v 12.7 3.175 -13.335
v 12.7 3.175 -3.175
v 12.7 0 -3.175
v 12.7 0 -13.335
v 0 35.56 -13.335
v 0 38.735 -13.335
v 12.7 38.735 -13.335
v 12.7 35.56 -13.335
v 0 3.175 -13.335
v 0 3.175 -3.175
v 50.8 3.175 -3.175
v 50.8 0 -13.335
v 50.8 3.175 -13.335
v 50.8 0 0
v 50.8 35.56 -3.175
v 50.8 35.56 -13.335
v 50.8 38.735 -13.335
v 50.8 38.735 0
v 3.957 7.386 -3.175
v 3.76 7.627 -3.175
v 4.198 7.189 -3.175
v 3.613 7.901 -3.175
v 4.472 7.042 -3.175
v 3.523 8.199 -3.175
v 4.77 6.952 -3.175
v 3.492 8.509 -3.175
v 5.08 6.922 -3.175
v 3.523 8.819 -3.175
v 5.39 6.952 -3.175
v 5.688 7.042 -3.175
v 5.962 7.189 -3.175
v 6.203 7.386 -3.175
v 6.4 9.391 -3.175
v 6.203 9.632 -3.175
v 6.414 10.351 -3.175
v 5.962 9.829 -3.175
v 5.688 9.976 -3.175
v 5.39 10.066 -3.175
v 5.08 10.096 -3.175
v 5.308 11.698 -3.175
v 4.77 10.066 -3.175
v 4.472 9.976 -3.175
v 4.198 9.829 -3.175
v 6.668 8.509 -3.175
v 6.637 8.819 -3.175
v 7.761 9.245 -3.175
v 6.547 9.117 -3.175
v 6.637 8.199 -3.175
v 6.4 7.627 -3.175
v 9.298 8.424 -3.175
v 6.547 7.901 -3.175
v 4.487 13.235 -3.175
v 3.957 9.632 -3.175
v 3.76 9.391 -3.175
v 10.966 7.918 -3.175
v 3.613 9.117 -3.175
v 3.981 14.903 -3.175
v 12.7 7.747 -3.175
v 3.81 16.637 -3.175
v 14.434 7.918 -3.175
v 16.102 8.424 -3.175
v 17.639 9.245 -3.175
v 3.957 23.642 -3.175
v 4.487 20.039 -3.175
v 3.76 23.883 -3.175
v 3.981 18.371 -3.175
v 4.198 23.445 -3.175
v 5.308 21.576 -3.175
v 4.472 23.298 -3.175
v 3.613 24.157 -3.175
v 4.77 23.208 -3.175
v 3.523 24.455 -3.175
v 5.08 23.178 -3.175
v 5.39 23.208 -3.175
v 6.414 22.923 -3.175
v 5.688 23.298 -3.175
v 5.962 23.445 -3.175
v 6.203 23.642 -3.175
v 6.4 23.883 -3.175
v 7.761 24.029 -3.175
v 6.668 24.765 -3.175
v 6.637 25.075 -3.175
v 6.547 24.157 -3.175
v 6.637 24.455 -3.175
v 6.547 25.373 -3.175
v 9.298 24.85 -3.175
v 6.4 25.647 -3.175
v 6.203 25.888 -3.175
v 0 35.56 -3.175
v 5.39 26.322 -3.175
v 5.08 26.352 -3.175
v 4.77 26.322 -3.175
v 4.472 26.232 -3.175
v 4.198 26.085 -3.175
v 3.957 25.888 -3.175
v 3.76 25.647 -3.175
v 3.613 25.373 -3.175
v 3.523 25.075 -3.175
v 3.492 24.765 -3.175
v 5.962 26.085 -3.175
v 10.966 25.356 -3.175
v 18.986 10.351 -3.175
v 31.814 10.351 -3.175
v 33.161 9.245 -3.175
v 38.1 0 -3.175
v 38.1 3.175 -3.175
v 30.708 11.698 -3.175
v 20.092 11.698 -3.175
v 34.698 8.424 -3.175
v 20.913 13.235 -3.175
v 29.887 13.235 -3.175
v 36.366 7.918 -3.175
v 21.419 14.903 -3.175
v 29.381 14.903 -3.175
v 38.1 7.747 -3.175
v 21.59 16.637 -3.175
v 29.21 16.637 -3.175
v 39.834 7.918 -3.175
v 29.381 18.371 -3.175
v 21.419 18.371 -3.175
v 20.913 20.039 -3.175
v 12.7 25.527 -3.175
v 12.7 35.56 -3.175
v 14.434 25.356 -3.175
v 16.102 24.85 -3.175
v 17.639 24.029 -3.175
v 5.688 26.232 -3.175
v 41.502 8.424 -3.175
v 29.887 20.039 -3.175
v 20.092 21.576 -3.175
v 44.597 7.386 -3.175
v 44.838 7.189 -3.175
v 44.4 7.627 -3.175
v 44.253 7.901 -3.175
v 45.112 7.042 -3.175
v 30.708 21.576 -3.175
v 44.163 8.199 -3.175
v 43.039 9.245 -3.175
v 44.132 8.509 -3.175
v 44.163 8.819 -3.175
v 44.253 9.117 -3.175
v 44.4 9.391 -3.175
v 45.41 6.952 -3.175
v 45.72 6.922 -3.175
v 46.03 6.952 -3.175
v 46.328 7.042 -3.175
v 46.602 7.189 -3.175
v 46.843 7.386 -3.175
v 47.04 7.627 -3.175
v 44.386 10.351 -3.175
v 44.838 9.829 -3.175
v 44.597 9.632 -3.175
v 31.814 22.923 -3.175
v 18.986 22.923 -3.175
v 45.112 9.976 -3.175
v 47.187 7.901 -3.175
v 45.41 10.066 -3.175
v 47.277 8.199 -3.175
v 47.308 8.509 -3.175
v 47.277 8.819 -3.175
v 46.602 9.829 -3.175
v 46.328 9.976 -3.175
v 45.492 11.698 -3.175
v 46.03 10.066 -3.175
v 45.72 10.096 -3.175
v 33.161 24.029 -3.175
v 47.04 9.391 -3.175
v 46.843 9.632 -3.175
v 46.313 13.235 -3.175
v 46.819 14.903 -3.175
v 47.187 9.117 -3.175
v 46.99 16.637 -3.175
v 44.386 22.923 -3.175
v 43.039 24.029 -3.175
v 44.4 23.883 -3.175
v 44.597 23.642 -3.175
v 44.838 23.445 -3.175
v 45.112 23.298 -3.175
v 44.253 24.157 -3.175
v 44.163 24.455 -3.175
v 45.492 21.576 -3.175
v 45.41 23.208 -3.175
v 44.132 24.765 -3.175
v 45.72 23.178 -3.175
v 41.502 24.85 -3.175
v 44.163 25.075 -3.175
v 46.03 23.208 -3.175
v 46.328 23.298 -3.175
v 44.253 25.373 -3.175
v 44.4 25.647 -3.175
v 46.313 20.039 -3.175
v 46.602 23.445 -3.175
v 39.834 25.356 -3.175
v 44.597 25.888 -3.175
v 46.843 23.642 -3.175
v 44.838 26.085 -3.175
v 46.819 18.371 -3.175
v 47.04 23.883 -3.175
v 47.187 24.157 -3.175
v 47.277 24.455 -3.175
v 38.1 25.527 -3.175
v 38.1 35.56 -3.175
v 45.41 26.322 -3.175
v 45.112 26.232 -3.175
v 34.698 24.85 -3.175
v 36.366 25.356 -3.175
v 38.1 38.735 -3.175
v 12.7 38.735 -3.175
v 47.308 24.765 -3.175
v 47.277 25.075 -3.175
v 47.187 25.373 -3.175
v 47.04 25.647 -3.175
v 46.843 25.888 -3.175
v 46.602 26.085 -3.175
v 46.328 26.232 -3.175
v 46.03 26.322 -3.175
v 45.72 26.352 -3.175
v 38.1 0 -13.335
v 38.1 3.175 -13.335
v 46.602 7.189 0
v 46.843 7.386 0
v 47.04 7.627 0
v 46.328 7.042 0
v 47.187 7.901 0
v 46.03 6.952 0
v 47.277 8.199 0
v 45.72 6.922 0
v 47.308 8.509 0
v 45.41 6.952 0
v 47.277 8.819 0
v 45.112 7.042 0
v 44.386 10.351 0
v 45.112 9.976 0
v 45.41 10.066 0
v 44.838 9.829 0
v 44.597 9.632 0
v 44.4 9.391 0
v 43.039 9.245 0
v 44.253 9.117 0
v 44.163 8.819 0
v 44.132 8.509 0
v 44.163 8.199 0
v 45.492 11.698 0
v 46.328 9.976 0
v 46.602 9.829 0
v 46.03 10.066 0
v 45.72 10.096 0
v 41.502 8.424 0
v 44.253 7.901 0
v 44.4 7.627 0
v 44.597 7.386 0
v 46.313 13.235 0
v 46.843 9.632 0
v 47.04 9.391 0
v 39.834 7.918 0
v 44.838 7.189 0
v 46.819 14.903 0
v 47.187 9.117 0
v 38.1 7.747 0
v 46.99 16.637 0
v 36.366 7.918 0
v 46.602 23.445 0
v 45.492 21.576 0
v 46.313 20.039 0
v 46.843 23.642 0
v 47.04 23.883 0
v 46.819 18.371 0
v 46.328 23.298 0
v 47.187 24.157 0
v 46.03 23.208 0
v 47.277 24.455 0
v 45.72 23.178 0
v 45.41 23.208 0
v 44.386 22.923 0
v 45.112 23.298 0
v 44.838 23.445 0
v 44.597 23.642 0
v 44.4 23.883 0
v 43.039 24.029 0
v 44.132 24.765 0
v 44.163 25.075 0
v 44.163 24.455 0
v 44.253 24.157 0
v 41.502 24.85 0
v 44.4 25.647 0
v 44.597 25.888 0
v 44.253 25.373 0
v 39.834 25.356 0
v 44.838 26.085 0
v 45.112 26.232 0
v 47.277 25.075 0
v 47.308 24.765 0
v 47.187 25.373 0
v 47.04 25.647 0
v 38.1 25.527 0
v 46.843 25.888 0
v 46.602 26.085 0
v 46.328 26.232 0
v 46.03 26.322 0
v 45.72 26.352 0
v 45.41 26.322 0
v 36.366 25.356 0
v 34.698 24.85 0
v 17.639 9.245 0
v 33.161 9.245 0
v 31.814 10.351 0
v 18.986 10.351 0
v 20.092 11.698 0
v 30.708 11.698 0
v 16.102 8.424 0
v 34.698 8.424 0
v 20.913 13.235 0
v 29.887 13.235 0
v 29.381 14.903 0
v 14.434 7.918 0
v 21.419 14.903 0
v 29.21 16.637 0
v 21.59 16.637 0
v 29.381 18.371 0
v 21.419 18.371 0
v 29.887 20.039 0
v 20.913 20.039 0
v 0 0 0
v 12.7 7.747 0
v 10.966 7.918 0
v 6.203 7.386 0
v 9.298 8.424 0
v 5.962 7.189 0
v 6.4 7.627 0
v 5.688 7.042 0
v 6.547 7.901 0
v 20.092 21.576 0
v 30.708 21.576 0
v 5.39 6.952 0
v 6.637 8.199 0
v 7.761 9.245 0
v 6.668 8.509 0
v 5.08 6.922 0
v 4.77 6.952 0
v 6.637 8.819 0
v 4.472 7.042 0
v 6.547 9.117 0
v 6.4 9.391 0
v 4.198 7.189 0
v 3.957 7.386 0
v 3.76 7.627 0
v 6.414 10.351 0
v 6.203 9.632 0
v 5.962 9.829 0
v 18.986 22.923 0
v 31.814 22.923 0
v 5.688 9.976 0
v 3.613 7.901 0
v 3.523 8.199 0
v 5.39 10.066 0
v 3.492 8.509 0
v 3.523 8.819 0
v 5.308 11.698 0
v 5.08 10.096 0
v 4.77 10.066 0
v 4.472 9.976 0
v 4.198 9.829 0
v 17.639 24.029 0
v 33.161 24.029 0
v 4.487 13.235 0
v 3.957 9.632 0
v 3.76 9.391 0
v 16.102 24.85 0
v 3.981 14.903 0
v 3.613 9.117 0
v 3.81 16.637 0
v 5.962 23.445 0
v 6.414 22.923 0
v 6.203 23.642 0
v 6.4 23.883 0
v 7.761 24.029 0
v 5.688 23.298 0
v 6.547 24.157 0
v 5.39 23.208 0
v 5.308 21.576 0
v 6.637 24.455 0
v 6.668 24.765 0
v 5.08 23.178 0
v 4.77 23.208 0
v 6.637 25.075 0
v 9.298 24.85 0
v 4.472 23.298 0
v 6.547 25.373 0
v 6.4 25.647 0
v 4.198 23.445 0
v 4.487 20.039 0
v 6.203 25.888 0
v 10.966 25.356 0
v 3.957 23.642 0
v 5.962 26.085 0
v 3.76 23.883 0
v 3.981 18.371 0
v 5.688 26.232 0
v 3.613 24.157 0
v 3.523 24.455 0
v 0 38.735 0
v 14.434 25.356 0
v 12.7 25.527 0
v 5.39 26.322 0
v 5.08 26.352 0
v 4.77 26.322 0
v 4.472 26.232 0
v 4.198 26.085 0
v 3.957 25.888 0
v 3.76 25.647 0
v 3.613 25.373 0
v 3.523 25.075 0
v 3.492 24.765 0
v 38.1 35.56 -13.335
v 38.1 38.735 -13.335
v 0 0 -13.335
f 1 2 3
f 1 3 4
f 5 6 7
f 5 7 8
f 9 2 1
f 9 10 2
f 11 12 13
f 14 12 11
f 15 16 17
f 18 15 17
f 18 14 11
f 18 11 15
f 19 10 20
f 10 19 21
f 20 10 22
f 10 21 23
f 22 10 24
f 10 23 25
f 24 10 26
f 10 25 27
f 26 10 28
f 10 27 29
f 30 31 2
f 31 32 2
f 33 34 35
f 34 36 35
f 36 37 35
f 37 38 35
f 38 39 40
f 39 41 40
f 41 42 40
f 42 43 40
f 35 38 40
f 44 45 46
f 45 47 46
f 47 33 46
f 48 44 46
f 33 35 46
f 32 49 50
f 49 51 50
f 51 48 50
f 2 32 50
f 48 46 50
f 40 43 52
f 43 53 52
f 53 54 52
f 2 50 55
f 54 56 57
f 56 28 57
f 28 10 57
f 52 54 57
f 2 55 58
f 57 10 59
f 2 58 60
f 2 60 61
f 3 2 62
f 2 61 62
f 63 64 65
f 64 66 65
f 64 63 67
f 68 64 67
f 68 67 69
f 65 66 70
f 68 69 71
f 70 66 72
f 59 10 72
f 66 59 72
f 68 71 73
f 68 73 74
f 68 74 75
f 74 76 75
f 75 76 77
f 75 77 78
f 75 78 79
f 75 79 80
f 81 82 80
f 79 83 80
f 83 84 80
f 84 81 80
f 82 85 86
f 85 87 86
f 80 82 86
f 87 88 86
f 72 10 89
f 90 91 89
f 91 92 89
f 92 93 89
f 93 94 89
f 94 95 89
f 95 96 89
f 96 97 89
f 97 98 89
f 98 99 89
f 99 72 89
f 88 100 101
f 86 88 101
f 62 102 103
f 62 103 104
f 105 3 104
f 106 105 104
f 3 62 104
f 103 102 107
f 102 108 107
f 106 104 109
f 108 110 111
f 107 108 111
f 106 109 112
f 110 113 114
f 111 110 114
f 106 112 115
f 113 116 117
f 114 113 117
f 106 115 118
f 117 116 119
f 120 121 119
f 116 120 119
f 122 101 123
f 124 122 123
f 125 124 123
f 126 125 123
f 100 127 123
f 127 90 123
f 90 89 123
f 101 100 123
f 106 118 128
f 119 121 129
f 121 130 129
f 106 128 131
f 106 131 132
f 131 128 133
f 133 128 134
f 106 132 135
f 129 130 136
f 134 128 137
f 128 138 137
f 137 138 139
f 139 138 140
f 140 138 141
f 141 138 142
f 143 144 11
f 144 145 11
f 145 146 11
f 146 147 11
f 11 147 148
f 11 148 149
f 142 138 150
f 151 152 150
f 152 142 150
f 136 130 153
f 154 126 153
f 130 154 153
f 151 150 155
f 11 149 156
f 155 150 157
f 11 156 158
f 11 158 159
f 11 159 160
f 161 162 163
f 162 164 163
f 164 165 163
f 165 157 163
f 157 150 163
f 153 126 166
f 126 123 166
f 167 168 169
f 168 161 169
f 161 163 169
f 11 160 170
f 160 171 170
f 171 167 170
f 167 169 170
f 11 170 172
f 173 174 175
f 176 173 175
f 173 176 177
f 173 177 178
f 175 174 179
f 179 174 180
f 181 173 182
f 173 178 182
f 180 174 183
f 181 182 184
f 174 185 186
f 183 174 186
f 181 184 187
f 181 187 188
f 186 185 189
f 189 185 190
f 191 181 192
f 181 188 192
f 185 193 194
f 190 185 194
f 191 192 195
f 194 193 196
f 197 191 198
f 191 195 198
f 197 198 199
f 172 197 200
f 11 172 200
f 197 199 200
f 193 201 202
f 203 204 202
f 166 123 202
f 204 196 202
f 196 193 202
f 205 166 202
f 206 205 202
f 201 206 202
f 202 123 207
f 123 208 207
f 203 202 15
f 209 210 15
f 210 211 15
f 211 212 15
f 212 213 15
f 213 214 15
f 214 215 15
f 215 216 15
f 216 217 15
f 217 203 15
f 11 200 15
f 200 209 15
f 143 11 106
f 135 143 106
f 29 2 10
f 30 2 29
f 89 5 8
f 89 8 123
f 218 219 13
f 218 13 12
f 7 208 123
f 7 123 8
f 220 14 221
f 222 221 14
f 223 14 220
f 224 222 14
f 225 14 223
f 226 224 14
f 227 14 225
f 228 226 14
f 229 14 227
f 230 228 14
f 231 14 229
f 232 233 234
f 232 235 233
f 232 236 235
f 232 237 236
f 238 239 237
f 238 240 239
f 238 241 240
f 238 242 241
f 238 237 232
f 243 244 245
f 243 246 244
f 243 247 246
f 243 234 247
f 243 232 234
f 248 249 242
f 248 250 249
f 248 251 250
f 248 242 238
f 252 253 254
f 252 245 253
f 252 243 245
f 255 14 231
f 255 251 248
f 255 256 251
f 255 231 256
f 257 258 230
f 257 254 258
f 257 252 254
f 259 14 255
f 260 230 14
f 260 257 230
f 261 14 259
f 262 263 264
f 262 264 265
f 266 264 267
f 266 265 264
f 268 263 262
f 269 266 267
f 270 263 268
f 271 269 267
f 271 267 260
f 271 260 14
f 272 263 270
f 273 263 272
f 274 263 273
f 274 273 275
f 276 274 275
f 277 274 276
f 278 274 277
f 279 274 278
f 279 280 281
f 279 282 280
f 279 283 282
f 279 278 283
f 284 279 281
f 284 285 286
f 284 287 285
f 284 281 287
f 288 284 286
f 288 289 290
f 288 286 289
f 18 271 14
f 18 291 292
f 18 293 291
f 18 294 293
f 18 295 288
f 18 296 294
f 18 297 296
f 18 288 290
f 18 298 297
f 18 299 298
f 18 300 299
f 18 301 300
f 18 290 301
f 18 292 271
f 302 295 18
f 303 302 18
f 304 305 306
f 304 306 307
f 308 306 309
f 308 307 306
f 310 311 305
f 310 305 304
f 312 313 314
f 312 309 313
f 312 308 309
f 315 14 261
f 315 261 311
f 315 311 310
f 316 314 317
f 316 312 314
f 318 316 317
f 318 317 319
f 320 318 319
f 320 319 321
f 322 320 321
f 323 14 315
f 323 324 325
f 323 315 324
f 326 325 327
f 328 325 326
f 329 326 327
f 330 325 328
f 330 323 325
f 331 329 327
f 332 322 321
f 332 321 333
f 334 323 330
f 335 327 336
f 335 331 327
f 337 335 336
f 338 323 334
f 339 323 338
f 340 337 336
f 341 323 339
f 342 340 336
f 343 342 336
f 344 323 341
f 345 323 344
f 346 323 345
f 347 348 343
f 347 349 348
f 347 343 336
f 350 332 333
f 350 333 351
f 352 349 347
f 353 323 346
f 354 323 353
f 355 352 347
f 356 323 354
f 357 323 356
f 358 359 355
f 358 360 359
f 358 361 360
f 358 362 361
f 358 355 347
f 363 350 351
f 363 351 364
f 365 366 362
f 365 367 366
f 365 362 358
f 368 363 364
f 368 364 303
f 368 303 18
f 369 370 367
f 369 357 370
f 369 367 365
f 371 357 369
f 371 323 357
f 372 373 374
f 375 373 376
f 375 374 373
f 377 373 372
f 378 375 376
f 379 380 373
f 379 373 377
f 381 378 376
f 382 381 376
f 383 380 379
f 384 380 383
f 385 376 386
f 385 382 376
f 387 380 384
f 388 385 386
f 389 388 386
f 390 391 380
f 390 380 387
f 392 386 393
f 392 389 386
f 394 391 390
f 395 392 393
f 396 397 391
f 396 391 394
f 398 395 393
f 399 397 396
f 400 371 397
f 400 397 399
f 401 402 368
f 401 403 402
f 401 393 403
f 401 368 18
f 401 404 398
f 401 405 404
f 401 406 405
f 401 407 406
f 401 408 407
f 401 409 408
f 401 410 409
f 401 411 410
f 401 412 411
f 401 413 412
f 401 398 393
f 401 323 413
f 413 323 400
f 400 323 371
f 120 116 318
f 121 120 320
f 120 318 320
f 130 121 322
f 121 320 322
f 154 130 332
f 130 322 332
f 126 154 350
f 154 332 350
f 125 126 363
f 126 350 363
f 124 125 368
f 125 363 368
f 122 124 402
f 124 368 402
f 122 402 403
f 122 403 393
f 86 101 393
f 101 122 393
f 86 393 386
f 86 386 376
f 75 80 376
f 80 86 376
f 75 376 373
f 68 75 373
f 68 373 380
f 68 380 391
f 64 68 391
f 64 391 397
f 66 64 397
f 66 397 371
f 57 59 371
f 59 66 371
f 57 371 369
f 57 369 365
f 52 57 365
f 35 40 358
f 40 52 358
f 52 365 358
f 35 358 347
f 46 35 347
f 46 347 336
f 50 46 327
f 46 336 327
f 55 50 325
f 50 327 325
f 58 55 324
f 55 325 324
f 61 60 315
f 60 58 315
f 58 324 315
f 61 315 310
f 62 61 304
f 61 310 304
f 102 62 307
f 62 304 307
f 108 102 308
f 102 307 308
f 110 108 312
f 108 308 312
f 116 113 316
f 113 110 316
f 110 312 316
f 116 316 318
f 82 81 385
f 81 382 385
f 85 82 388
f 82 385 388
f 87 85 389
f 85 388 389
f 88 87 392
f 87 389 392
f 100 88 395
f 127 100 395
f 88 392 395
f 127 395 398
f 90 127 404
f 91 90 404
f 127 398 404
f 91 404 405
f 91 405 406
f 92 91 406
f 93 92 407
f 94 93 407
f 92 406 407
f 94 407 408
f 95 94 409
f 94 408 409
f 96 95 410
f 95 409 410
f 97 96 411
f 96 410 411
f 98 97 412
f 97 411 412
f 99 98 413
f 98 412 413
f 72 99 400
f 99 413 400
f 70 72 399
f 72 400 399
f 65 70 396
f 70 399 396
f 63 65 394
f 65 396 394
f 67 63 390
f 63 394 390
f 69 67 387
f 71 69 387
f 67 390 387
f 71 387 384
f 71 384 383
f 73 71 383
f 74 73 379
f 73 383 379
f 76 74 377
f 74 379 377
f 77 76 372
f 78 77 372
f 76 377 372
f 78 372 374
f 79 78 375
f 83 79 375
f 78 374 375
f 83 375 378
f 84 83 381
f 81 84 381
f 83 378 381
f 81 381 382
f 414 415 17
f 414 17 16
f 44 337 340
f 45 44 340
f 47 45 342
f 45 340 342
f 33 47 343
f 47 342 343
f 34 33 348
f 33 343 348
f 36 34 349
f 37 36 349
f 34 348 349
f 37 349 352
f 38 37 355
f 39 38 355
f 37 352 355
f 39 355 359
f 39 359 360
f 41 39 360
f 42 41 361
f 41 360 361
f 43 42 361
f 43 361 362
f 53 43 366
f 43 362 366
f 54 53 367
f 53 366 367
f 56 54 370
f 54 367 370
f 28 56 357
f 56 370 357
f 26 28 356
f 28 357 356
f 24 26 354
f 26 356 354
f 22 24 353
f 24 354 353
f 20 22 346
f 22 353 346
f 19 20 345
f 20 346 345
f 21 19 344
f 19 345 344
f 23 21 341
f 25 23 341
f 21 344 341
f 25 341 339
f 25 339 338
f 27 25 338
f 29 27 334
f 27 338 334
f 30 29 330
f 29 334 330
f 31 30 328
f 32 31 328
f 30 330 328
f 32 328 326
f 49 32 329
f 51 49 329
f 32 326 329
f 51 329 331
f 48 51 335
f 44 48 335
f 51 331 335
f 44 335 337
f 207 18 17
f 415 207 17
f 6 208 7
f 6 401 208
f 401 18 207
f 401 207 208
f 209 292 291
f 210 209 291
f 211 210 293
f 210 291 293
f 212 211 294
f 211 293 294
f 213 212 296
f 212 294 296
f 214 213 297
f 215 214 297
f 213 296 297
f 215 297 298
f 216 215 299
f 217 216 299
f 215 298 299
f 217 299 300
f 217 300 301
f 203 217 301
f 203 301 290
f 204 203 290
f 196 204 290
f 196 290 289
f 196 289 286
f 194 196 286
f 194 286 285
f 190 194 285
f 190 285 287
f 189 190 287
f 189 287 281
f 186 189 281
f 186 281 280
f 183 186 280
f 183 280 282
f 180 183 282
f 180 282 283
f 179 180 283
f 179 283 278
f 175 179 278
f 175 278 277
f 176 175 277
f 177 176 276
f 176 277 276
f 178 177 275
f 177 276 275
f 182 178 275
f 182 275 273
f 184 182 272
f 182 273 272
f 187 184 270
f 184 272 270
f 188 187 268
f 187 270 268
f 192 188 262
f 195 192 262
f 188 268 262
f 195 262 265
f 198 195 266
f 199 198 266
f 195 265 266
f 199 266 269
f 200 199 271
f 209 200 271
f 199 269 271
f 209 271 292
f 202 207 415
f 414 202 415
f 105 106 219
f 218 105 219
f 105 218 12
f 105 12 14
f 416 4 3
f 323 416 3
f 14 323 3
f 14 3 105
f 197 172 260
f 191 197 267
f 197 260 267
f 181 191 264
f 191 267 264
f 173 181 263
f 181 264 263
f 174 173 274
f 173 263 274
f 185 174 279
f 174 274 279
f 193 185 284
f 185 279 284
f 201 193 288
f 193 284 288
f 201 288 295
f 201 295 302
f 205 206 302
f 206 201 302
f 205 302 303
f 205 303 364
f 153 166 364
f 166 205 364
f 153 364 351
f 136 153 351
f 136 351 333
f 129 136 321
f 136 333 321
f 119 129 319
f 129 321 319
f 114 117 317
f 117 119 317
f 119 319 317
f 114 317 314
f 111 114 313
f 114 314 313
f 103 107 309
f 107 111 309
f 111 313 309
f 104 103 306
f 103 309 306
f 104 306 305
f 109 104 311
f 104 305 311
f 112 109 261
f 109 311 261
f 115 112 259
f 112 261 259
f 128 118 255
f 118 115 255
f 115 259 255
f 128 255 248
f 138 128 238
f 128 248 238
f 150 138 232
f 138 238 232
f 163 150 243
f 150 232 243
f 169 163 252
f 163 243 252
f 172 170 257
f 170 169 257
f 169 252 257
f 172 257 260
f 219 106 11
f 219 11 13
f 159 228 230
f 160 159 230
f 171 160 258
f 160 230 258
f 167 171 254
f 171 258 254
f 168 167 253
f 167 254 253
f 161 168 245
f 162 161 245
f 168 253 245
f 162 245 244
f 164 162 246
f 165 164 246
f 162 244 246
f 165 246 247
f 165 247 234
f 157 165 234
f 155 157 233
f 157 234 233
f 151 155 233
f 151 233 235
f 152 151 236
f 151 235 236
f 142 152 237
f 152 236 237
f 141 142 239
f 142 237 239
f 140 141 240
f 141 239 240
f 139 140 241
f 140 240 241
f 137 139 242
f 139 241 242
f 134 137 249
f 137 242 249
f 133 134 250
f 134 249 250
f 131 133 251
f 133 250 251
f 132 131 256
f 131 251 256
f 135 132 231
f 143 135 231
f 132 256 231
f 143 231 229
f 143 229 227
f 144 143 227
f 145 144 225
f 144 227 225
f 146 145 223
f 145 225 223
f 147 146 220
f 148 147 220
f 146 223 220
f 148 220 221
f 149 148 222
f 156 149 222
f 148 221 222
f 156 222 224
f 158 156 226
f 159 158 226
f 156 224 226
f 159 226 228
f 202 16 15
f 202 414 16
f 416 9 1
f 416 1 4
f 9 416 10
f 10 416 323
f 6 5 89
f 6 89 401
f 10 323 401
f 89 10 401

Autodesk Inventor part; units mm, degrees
ref_plane "YZ Plane" through (0, 0, 0) normal (1, 0, 0) x (0, 1, 0)
ref_plane "XZ Plane" through (0, 0, 0) normal (0, 1, 0) x (-1, 0, 0)
ref_plane "XY Plane" through (0, 0, 0) normal (0, 0, 1) x (1, 0, 0)
sketch "Sketch1" plane through (0, 0, 0) normal (1, 0, 0) x (0, 1, 0)
  line L0 (0, 0) -> (35.56, 0)
  line L1 (35.56, -3.175) -> (3.175, -3.175)
  line L2 (3.175, -3.175) -> (3.175, -13.335)
  line L3 (3.175, -13.335) -> (0, -13.335)
  line L4 (0, -13.335) -> (0, 0)
  line L5 (35.56, 0) -> (38.735, 0)
  line L6 (38.735, 0) -> (38.735, -13.335)
  line L7 (38.735, -13.335) -> (35.56, -13.335)
  line L8 (35.56, -13.335) -> (35.56, -3.175)
  dimension "d0" = 3.175
  dimension "d1" = 35.56
  dimension "d33" = 13.335
  dimension "d34" = 3.175
  dimension "d48" = 90
  dimension "d49" = 13.335
  dimension "d50" = 3.175
  dimension "d51" = 10.16
extrude "Extrusion1" add sketch "Sketch1" along normal blind 50.8
sketch "Sketch3" plane through (0, 0, 0) normal (0, 0, 1) x (1, 0, 0)
  line L0 (0, 35.56) -> (50.8, 35.56) projected
  line L1 (25.4, 35.56) -> (25.4, 3.175) construction
  line L2 (0, 3.175) -> (50.8, 3.175) projected
  circle A0 centre (12.7, 16.637) radius 8.89
  circle A1 centre (38.1, 16.637) radius 8.89
  line L3 (0, 0) -> (0, 35.56) projected
  line L4 (0, 27.305) -> (50.8, 27.305) construction
  line L5 (0, 5.969) -> (52.4314, 5.969) construction
  line L6 (2.54, 27.305) -> (2.54, 5.969) construction
  line L7 (48.26, 27.305) -> (48.26, 5.969) construction
  circle A2 centre (5.08, 8.509) radius 1.5875
  circle A3 centre (45.72, 24.765) radius 1.5875
  circle A4 centre (5.08, 24.765) radius 1.5875
  circle A5 centre (45.72, 8.509) radius 1.5875
  dimension "d7" = 17.78
  dimension "d8" = 12.7
  dimension "d13" = 10.668
  dimension "d14" = 10.668
  dimension "d15" = 10.16
  dimension "d16" = 10.16
  dimension "d17" = 3.175
  dimension "d19" = 2.54
  dimension "d20" = 3.175
  dimension "d21" = 2.54
  dimension "d25" = 2.54
  dimension "d26" = 2.54
  dimension "d38" = 3.175
  dimension "d39" = 2.54
  dimension "d40" = 2.54
  dimension "d41" = 3.175
  dimension "d42" = 2.54
  dimension "d43" = 2.54
  dimension "d53" = 2.794
extrude "Extrusion2" cut sketch "Sketch3" against normal through all
sketch "Sketch5" plane through (0, 38.735, 0) normal (0, 1, 0) x (1, 0, 0)
  line L0 (0, 0) -> (50.8, 0) construction
  line L1 (0, 3.175) -> (50.8, 3.175) construction
  line L2 (12.7, 3.175) -> (12.7, 13.335)
  line L3 (0, 13.335) -> (50.8, 13.335) projected
  line L4 (38.1, 3.175) -> (38.1, 13.335)
  line L5 (0, 0) -> (0, 13.335) projected
  line L6 (12.7, 3.175) -> (38.1, 3.175)
  line L7 (12.7, 13.335) -> (38.1, 13.335)
  dimension "d44" = 25.4
  dimension "d45" = 12.7
extrude "Extrusion4" cut sketch "Sketch5" against normal through all
equation "\"d49\" = d33"
equation "\"d50\" = d0"
properties part number "ping_bracket"
